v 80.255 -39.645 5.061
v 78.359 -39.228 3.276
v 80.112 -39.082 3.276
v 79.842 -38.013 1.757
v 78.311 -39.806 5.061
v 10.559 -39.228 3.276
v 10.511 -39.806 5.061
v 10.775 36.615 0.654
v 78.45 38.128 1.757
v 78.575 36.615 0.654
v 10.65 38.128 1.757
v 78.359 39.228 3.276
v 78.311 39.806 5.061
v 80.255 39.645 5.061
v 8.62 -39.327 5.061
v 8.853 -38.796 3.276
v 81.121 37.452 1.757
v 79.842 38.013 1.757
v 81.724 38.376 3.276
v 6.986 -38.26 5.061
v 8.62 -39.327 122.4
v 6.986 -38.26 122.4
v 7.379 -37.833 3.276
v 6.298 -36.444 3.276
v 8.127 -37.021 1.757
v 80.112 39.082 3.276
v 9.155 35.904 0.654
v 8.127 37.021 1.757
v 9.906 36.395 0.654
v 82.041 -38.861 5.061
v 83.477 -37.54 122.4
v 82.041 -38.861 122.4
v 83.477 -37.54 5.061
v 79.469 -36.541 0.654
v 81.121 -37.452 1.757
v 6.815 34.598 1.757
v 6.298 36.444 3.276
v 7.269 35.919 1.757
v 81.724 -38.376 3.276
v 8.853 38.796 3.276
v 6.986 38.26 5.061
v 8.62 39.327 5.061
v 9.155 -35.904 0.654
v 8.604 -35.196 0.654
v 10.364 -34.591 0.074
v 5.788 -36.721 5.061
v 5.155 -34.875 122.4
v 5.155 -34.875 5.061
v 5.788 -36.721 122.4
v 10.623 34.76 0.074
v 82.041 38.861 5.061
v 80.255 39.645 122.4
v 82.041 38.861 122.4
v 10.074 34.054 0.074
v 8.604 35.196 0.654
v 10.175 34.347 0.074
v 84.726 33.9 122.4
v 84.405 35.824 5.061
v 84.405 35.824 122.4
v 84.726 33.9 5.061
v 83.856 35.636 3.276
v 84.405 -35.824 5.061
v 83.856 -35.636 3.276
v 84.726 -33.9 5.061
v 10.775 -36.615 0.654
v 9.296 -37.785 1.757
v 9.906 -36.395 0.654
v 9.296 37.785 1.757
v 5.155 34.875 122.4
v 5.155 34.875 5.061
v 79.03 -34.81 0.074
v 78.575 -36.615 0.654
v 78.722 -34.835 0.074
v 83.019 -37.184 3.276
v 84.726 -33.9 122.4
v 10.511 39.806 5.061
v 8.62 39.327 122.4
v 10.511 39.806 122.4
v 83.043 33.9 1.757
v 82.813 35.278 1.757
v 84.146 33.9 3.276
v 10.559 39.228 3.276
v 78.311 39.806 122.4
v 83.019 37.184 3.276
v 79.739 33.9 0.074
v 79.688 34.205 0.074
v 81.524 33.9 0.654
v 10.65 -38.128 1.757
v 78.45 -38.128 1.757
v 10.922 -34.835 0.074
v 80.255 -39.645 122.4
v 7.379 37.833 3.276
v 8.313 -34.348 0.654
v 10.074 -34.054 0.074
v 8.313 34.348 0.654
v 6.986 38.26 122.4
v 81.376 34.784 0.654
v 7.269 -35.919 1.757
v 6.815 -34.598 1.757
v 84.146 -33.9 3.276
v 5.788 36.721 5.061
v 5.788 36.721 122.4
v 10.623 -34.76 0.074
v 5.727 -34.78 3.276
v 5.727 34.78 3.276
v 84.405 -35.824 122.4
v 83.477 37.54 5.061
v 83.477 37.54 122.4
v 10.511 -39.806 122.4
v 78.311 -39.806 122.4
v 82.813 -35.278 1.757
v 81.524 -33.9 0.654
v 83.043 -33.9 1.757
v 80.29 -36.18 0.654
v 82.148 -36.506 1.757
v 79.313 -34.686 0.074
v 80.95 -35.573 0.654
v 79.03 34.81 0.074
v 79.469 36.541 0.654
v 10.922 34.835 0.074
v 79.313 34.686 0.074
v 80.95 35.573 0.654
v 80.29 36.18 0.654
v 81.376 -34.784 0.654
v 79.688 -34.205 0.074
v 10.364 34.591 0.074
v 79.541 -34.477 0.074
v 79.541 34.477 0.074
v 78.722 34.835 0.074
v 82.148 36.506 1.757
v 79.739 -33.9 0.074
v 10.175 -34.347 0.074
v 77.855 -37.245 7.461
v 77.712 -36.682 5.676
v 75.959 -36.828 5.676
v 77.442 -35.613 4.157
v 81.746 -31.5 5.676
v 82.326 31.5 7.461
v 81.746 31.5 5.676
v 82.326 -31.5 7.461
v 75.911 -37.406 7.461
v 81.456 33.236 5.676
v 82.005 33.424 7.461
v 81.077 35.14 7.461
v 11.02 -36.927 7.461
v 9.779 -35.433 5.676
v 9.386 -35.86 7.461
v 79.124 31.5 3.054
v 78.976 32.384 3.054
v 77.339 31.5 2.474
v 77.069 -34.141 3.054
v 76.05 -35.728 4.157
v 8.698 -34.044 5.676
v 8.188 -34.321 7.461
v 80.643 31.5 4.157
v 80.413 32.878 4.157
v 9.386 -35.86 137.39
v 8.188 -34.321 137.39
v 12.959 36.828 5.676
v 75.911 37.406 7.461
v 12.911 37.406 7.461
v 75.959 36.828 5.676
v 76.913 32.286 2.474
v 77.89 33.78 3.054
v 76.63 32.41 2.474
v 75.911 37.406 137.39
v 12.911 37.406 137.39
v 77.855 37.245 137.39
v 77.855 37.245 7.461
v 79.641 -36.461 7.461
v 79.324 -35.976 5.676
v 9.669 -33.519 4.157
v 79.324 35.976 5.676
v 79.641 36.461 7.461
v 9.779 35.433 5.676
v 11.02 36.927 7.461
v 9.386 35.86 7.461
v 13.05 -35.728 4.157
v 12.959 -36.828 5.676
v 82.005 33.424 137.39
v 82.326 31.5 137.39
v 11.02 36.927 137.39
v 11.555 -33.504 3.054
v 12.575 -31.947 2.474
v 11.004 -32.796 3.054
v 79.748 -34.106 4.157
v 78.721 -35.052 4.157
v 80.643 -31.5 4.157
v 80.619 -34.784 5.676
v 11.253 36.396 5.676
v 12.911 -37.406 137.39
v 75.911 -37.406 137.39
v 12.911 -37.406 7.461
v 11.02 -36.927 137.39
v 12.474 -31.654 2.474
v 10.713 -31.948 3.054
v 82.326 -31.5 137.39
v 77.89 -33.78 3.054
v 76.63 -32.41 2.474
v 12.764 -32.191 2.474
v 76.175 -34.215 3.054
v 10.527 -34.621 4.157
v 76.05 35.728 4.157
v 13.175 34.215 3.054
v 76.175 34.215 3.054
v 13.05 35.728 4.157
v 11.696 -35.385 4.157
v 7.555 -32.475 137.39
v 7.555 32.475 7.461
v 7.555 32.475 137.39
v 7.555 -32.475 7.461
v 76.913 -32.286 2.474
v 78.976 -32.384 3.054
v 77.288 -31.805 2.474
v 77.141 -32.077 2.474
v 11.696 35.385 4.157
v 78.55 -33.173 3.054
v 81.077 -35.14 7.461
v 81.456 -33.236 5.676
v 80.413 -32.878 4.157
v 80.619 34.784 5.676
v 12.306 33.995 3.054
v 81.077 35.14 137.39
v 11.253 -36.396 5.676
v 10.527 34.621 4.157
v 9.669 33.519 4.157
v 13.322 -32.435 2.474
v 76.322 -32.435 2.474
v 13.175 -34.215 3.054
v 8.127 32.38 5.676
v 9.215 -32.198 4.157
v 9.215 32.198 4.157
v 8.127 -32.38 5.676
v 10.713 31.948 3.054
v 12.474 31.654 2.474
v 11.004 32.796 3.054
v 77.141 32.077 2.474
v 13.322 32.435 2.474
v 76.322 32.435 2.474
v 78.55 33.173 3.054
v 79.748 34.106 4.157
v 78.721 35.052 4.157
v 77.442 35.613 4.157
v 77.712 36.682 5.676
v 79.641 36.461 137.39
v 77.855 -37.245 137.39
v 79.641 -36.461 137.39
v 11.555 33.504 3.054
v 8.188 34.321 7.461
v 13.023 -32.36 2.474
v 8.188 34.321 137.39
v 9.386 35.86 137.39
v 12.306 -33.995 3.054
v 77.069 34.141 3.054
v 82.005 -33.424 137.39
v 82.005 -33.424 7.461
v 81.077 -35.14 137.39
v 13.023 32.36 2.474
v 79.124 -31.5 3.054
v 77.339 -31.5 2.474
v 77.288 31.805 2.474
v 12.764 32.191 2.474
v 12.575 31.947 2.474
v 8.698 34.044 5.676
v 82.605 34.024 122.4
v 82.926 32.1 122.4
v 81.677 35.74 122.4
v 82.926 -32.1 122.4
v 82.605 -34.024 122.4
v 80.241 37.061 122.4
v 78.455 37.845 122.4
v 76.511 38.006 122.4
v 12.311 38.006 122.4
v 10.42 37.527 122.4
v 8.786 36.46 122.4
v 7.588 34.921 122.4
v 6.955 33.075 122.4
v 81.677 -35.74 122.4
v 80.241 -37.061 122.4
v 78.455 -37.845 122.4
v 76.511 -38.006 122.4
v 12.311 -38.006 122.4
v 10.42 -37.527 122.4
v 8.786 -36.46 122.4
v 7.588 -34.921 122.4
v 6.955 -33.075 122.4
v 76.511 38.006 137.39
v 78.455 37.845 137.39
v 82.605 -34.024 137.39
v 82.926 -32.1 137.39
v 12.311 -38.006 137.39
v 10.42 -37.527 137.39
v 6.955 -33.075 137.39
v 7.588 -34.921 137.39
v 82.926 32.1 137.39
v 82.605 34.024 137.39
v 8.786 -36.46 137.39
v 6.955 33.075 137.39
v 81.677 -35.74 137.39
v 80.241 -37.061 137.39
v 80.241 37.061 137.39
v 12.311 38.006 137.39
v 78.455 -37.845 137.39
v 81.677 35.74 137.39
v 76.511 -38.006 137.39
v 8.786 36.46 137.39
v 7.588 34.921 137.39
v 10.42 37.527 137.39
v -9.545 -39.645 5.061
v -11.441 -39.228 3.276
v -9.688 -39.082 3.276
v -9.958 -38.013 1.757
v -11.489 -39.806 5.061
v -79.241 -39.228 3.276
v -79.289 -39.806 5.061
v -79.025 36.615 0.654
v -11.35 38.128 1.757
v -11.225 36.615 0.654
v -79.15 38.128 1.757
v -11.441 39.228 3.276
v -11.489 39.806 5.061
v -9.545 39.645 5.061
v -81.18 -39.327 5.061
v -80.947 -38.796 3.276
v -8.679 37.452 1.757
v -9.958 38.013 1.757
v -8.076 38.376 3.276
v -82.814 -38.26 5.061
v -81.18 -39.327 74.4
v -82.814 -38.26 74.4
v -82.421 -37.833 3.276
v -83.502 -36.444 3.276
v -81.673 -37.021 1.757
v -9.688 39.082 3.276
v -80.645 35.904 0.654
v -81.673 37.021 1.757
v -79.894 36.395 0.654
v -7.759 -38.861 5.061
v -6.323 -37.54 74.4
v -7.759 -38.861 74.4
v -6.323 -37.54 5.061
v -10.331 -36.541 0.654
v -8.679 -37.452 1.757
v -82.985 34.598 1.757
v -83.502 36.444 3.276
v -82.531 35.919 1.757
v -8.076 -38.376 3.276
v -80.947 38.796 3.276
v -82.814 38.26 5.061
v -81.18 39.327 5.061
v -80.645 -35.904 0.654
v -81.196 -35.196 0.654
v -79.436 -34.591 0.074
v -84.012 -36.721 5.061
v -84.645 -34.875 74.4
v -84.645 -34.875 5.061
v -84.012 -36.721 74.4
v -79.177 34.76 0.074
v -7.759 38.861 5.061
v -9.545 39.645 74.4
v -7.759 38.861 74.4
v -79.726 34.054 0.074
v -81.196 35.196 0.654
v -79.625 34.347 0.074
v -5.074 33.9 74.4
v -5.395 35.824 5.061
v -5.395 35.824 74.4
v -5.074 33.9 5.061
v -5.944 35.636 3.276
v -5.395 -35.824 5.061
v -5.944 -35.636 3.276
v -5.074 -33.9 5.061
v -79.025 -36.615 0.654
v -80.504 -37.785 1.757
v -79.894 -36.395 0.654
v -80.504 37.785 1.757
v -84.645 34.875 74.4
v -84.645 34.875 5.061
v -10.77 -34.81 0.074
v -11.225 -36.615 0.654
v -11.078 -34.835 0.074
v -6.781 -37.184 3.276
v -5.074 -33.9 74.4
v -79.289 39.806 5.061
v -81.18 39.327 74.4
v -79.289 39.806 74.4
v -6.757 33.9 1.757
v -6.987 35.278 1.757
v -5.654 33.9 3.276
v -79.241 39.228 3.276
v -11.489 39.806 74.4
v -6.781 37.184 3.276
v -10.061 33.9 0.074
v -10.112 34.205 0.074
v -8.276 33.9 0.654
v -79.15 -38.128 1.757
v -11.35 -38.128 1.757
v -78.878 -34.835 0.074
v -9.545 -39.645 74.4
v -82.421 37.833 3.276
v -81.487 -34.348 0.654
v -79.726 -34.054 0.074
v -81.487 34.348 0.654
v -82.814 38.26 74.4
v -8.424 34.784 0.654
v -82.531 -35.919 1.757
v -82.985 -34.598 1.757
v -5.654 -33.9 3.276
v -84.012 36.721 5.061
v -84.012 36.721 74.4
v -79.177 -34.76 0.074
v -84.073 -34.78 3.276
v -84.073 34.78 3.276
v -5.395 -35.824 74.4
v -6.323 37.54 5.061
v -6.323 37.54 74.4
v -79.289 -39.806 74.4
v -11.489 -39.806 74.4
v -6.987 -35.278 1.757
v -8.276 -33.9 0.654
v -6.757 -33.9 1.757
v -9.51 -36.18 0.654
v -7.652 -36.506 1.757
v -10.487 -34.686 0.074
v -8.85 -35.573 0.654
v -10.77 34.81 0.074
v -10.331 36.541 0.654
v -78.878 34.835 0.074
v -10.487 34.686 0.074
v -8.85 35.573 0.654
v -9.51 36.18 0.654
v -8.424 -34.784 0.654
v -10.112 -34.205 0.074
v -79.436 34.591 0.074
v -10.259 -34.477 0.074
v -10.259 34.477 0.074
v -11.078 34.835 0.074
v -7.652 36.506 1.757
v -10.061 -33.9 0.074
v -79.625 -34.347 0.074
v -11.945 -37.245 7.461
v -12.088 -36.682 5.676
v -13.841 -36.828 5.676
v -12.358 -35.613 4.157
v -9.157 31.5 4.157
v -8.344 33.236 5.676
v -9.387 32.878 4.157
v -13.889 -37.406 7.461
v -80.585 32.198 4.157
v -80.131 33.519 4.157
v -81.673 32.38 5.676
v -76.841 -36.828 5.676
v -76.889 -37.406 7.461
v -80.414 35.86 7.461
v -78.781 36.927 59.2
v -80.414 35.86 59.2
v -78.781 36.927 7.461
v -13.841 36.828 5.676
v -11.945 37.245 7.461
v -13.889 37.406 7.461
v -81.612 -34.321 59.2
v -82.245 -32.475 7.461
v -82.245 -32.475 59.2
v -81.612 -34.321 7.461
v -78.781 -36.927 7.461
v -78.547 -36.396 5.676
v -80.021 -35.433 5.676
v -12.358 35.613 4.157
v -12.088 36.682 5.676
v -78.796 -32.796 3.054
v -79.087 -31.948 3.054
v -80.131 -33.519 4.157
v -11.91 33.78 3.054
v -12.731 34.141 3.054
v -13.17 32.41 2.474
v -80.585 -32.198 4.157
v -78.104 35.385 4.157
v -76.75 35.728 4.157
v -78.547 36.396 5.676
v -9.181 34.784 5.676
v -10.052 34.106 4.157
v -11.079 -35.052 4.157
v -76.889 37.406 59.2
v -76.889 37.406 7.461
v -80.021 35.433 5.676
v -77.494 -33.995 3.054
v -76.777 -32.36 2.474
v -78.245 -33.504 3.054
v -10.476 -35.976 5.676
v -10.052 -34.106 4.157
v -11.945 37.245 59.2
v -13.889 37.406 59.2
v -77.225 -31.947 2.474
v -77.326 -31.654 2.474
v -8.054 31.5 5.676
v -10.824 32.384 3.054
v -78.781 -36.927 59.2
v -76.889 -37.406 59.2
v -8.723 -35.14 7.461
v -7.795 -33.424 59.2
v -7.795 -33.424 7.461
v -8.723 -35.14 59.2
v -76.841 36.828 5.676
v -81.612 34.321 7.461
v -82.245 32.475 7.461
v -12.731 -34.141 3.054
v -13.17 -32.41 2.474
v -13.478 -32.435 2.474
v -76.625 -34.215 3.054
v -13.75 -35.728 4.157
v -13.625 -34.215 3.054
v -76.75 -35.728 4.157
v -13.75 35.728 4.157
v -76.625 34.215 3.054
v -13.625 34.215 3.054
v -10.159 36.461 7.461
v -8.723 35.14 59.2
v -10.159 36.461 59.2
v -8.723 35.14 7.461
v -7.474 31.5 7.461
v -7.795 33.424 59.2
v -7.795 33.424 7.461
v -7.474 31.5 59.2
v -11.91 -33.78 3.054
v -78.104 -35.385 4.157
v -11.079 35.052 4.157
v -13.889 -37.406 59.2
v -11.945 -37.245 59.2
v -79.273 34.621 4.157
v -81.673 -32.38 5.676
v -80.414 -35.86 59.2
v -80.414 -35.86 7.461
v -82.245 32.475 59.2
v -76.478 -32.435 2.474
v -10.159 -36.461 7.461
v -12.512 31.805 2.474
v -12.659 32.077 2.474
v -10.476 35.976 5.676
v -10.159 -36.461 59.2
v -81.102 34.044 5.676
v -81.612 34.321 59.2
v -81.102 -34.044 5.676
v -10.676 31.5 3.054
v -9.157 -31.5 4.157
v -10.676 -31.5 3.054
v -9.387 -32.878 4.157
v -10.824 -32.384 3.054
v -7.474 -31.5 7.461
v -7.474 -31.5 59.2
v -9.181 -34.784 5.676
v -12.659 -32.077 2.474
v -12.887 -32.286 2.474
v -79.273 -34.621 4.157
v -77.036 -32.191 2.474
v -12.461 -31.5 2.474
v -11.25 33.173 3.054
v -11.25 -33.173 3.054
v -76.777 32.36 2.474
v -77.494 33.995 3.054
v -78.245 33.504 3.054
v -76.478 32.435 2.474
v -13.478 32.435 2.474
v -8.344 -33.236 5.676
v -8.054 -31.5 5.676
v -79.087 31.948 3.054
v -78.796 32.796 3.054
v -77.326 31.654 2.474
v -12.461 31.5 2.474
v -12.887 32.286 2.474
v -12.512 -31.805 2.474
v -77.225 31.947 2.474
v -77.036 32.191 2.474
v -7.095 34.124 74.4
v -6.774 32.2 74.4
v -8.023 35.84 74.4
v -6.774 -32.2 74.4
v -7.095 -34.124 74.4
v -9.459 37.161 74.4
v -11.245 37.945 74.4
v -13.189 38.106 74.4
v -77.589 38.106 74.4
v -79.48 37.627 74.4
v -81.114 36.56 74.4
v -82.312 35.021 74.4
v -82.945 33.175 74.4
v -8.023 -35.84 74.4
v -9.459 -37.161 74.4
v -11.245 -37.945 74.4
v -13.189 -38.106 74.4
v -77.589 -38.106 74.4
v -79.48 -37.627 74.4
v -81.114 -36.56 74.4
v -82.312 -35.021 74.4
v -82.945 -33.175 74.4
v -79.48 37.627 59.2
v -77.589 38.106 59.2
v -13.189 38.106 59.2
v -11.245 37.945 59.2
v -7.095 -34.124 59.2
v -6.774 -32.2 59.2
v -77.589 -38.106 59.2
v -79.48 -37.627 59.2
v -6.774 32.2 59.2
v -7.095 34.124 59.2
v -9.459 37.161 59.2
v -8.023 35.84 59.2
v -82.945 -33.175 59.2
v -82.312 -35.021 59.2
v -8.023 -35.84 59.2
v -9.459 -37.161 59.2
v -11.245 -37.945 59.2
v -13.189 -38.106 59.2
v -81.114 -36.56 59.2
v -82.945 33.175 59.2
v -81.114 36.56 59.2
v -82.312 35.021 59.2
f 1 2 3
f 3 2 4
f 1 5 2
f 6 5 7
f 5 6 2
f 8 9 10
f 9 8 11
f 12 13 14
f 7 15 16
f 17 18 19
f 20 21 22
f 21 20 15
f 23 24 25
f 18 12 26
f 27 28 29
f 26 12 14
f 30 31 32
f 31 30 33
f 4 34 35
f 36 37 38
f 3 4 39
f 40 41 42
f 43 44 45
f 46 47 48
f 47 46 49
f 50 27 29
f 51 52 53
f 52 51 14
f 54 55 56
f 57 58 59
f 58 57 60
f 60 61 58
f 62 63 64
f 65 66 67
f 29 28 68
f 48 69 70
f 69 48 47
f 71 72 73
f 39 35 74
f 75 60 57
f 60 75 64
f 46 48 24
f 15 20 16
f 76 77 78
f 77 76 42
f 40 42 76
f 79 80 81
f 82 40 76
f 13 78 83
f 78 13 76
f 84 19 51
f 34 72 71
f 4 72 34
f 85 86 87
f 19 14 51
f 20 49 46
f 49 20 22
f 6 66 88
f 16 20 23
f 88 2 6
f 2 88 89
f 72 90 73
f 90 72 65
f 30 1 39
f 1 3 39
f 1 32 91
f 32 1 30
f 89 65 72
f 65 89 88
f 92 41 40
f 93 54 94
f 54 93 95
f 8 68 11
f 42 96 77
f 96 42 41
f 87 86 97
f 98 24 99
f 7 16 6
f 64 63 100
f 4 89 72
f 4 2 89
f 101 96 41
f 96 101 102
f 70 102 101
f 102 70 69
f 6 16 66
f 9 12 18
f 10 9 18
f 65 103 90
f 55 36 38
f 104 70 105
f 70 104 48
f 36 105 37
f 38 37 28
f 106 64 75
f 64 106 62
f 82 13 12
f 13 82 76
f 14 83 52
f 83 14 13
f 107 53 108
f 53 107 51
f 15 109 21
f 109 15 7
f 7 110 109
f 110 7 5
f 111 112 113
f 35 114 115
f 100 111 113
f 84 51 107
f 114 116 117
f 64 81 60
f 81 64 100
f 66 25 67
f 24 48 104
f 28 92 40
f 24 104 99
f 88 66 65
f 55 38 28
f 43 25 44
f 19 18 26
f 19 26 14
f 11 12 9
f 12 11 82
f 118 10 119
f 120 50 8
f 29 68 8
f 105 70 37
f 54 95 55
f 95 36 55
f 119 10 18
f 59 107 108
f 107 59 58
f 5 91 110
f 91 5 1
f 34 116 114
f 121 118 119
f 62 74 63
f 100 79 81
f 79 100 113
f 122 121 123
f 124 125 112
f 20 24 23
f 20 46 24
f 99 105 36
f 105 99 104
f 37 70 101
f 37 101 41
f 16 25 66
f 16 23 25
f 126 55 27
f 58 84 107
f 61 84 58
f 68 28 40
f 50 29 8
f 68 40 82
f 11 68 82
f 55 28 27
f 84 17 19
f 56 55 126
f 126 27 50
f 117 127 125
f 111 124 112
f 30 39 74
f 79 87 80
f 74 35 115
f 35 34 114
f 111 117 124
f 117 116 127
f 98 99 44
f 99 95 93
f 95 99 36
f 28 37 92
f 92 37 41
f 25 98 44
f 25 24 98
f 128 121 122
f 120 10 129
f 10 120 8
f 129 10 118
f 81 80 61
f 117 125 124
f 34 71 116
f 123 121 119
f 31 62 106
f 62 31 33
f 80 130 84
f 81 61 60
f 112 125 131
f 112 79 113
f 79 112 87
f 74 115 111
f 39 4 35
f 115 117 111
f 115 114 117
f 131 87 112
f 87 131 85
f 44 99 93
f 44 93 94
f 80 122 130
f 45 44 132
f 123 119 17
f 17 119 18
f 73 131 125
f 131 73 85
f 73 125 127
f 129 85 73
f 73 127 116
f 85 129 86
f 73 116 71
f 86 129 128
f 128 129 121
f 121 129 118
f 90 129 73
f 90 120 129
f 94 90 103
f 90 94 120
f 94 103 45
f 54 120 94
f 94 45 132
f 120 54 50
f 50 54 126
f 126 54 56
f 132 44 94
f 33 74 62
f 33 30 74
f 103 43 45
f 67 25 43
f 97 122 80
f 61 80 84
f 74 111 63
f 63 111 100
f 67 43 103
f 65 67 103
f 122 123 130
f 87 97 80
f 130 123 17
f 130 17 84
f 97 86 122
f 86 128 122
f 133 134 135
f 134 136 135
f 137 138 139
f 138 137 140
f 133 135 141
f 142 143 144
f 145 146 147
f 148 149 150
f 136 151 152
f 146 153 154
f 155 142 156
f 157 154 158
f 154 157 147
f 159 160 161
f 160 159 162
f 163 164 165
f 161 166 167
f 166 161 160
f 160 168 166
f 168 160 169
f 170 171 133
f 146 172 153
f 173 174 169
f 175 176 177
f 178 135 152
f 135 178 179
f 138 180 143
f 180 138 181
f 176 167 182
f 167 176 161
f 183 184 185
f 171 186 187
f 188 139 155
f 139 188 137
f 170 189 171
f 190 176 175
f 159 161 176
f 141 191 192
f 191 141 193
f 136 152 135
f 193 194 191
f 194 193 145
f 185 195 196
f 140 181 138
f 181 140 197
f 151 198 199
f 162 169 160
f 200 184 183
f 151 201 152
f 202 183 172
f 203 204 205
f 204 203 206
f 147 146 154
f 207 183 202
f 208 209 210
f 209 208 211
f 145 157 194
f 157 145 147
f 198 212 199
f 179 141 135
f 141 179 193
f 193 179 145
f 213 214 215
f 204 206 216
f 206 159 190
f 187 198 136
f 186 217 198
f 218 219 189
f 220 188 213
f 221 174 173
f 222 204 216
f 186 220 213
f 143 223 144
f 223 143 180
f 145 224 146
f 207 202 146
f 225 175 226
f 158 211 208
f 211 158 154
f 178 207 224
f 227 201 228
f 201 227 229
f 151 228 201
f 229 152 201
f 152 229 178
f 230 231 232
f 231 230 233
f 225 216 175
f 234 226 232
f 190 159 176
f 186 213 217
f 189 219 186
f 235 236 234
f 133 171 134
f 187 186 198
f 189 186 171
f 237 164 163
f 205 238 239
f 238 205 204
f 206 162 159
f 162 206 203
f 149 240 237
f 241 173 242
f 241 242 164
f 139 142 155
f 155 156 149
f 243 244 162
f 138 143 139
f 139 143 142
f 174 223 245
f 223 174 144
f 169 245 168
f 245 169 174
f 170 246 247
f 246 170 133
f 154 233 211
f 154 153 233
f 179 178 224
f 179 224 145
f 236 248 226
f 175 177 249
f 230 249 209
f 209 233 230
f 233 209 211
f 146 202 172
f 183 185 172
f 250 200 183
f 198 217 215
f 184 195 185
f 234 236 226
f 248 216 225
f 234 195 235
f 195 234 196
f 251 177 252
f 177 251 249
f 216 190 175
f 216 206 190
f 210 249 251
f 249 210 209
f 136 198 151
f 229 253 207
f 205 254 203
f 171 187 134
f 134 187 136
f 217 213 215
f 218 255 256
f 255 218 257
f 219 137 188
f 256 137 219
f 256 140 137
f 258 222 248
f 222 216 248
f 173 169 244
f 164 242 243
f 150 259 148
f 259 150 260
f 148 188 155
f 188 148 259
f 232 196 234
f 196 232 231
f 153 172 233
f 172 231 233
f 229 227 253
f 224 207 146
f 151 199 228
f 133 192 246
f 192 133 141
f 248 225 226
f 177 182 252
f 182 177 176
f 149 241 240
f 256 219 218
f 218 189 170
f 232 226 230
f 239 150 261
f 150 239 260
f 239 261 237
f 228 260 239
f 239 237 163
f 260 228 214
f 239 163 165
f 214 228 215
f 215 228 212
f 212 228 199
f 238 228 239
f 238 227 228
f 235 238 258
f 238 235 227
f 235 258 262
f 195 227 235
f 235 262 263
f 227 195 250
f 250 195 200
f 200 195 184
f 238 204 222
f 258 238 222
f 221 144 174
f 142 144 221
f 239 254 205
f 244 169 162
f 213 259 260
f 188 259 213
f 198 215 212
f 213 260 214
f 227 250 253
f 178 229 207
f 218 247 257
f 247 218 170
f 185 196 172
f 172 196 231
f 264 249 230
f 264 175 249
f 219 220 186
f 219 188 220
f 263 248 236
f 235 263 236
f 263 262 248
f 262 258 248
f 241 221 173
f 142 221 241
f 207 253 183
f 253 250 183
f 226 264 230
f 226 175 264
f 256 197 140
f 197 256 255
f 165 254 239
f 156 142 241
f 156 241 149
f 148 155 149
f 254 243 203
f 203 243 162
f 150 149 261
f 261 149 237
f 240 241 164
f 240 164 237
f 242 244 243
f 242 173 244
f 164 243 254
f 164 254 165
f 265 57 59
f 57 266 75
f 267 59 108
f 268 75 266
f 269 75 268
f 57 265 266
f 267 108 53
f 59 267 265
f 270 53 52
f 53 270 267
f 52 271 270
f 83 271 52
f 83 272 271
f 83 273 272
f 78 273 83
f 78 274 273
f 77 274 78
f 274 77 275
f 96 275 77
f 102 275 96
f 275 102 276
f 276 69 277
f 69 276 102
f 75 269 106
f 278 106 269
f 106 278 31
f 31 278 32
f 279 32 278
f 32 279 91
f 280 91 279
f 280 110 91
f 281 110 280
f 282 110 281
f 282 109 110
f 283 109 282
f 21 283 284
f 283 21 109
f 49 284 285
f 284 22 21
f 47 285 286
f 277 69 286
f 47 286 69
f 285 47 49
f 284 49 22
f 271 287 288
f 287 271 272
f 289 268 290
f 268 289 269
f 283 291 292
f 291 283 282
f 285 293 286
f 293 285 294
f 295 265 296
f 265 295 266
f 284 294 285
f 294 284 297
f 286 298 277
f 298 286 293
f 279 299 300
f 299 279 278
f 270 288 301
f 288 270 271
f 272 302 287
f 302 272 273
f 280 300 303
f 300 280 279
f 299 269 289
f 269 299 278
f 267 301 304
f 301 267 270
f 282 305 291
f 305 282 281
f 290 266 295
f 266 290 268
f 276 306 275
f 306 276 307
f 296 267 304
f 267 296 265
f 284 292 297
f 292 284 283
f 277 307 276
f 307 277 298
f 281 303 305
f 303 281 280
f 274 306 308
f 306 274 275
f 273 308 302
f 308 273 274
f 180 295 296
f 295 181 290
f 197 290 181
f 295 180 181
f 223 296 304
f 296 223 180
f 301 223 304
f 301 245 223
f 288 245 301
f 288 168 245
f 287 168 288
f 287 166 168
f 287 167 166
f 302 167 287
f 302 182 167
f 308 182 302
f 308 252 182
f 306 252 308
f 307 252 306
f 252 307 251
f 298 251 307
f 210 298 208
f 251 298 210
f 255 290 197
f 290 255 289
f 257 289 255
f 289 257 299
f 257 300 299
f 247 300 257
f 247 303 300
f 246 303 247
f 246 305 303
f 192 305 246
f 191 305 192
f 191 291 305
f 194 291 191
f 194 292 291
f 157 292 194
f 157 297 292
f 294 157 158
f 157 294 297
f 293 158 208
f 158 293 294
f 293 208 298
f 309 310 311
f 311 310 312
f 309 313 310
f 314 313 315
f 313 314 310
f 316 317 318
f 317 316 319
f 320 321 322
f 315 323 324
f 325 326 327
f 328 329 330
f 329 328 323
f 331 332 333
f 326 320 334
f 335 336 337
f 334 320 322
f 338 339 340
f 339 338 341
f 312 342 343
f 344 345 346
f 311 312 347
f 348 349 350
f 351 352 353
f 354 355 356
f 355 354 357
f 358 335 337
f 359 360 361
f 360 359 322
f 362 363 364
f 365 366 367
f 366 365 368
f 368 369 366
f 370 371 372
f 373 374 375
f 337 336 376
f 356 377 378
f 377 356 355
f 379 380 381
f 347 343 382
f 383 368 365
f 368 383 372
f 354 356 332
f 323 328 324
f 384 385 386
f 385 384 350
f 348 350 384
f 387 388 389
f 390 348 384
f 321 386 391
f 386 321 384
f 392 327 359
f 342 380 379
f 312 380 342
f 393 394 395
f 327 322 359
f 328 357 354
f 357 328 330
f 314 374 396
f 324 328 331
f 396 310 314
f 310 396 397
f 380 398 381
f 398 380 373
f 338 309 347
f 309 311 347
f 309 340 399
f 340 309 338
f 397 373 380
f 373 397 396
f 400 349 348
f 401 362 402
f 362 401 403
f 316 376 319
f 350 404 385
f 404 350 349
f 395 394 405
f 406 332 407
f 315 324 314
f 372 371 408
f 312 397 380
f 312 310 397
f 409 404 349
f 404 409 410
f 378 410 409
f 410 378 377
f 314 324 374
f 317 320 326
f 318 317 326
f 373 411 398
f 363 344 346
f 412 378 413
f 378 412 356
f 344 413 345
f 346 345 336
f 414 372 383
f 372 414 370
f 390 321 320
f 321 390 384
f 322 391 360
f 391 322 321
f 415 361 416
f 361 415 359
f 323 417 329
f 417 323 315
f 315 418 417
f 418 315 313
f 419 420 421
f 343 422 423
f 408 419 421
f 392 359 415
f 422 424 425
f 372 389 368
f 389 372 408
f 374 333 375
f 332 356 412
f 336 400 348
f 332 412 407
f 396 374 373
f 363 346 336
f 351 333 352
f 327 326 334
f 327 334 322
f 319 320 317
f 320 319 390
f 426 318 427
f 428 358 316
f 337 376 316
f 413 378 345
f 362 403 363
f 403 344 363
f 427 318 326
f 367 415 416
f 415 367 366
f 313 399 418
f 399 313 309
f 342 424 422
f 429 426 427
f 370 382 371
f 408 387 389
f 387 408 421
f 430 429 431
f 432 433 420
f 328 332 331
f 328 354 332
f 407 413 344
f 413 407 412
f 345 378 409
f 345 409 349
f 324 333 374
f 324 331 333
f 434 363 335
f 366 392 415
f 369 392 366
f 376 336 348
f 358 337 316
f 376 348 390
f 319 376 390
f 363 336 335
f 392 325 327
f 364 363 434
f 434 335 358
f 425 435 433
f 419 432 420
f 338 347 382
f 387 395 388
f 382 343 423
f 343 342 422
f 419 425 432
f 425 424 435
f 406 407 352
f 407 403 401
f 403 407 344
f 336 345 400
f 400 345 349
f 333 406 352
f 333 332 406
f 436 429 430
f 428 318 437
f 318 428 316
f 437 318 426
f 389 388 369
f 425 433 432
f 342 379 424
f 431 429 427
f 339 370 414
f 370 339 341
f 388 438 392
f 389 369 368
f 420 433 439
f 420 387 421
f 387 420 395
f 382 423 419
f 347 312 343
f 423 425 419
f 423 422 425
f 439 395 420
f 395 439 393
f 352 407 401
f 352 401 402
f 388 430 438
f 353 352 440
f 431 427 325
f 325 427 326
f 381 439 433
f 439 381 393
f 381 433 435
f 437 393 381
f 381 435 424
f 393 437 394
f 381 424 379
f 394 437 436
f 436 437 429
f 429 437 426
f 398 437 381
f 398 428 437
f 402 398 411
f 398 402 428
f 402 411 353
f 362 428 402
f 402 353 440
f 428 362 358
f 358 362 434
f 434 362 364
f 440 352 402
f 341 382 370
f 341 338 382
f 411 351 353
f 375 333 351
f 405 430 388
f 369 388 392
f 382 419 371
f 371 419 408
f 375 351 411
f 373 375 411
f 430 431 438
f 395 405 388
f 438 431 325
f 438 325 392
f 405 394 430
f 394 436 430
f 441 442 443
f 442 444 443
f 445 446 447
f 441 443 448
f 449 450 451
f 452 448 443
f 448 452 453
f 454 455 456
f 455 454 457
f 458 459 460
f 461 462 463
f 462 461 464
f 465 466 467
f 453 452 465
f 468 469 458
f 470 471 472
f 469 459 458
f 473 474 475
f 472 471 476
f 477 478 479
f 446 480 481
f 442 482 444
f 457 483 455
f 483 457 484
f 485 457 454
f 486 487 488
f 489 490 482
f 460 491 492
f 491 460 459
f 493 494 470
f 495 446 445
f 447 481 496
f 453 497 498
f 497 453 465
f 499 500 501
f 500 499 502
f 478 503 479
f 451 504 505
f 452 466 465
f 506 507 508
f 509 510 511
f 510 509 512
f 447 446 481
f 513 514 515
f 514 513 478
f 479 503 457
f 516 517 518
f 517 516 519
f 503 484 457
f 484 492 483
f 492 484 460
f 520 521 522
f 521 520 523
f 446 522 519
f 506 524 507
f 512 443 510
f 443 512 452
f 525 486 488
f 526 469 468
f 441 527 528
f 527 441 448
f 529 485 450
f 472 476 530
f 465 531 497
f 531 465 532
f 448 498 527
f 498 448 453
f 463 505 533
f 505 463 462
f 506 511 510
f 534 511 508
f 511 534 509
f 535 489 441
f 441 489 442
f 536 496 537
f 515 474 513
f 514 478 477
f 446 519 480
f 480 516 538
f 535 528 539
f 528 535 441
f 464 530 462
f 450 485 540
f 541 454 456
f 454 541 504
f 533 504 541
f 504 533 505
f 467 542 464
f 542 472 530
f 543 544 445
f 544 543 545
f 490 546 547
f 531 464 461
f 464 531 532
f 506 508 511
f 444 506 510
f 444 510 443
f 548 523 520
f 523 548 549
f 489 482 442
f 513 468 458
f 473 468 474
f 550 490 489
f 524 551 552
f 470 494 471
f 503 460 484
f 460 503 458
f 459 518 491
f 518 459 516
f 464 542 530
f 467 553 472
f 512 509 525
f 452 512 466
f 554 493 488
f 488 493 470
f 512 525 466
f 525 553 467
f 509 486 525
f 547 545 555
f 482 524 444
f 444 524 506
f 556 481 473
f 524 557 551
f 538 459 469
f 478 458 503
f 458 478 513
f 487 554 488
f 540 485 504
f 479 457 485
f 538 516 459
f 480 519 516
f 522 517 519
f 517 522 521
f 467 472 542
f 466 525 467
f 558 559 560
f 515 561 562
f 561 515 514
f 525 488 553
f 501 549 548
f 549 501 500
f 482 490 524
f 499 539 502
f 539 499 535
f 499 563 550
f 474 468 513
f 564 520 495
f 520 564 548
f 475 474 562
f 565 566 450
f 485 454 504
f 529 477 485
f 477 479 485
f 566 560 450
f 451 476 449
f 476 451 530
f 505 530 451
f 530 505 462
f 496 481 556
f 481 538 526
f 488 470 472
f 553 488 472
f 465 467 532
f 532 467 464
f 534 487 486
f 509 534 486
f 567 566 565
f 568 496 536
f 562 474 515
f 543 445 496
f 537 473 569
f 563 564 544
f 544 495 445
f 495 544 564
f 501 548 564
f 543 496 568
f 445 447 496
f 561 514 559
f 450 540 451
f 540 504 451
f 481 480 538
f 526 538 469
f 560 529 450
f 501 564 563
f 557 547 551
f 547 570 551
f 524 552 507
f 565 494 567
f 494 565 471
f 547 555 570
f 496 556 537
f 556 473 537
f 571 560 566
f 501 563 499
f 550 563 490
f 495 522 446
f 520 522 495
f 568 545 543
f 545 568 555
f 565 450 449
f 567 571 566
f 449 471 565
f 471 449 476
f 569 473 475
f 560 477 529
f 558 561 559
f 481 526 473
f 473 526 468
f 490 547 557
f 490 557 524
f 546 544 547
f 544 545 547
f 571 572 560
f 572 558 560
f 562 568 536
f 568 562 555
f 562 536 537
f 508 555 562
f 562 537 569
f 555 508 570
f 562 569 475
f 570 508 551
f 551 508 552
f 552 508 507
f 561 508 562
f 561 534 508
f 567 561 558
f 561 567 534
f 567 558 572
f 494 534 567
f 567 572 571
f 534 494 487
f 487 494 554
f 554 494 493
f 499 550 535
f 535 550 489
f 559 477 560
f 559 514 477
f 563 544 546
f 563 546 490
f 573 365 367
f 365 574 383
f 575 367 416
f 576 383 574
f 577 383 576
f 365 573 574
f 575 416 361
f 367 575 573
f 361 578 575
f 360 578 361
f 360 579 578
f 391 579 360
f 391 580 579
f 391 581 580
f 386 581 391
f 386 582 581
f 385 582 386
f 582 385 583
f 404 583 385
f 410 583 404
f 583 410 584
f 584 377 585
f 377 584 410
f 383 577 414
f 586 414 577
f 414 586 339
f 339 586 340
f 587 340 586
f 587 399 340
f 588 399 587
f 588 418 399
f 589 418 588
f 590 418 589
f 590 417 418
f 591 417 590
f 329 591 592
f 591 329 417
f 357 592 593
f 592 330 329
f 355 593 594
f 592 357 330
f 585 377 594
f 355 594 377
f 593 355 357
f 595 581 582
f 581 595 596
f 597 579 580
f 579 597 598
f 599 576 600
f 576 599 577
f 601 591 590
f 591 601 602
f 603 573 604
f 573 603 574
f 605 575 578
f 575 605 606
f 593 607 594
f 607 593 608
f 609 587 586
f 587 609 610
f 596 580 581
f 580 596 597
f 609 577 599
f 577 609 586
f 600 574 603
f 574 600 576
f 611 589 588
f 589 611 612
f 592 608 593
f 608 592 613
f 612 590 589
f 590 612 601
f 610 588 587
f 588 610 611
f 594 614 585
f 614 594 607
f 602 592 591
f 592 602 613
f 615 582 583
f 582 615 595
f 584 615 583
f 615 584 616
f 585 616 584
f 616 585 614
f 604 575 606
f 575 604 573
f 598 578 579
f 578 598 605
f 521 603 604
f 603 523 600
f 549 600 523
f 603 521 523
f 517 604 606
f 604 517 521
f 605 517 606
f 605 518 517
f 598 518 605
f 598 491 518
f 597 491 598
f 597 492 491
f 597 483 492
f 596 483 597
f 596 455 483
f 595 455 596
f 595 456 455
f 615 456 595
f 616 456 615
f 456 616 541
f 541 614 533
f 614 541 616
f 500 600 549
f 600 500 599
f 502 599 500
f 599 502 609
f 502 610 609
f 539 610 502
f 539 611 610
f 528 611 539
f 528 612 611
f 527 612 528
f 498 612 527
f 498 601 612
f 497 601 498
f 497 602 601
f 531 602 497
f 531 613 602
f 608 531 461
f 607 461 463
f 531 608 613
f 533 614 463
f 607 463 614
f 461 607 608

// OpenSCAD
// file: boxes.scad
// Library: boxes.scad
// Version: 1.0
// Author: Marius Kintel
// Copyright: 2010
// License: 2-clause BSD License (http://opensource.org/licenses/BSD-2-Clause)

// 
// roundedCube([x, y, z], r, sidesonly=true/false, center=true/false);
// roundedCube(x, r, sidesonly=true/false, center=true/false);

// EXAMPLE USAGE:
// roundedCube([20, 30, 40], 5, true, true);

// Only for backwards compatibility with existing scripts, (always centered, radius instead of consistent "r" naming.
module roundedBox(size, radius, sidesonly)
{
  echo("WARNING: roundedBox(size, radius, sidesonly) is deprecated, use roundedCube(size, r, sidesonly, center)");
  roundedCube(size, radius, sidesonly, true);
}

// New implementation
module roundedCube(size, r, sidesonly, center) {
  s = is_list(size) ? size : [size,size,size];
  translate(center ? -s/2 : [0,0,0]) {
    if (sidesonly) {
      hull() {
        translate([     r,     r]) cylinder(r=r, h=s[2]);
        translate([     r,s[1]-r]) cylinder(r=r, h=s[2]);
        translate([s[0]-r,     r]) cylinder(r=r, h=s[2]);
        translate([s[0]-r,s[1]-r]) cylinder(r=r, h=s[2]);
      }
    }
    else {
      hull() {
        translate([     r,     r,     r]) sphere(r=r);
        translate([     r,     r,s[2]-r]) sphere(r=r);
        translate([     r,s[1]-r,     r]) sphere(r=r);
        translate([     r,s[1]-r,s[2]-r]) sphere(r=r);
        translate([s[0]-r,     r,     r]) sphere(r=r);
        translate([s[0]-r,     r,s[2]-r]) sphere(r=r);
        translate([s[0]-r,s[1]-r,     r]) sphere(r=r);
        translate([s[0]-r,s[1]-r,s[2]-r]) sphere(r=r);
      }
    }
  }
}
// main file
include <boxes.scad>

// Internal width of box
width_inner = 75;

// Internal bength of box
length_inner = 75;

// Internal height of bottom of box
base_height = 120;

// Internal height of the top/lid of the box
lid_height = 72;

// Height of the lip to generate
overlap_height = 15;

// Thickness of the outer wall
wall_thickness = 2.4;

// How curved to make the corners
radius = 6; // [1:10]

// Tolerance between lid and lip
tolerance = 0.2;

// Ratio of lip to regular wall thickness
lip_thickness_ratio = 0.5;

height_inner = base_height + lid_height;

lip_thickness = wall_thickness * lip_thickness_ratio;

width_outer = width_inner + wall_thickness*2;
length_outer = length_inner + wall_thickness*2;
height_outer = height_inner + wall_thickness*2;

module lip(tol = 0) {
    difference() {
        // The outside shell
        roundedCube(
            [width_inner+lip_thickness+tol,length_inner+lip_thickness+tol,overlap_height*2],
            radius,
            center=true
        );
        // The inside cavity
        roundedCube(
            [width_inner-tol,length_inner-tol,overlap_height*2-wall_thickness/2],
            radius,
            center=true
        );
        // Slice off the top
        translate(v=[0,0,overlap_height+tol]) 
            cube([width_outer+1, length_outer+1,overlap_height], center=true);
        // Slice off the bottom
        translate(v=[0,0,-overlap_height-tol]) 
            cube([width_outer+1, length_outer+1,overlap_height], center=true);
    } 
}

module openBox(height) {
    other_height = height_outer-height;
    cut_height = height_outer/2-other_height/2;
     
    difference() {
        // The outside shell
        roundedCube([width_outer,length_outer,height_outer],radius,center=true);
        // The inside cavity
        roundedCube([width_inner,length_inner,height_inner],radius,center=true);
        // Cut the top off
        translate(v=[0,0,cut_height]) cube([width_outer+1,length_outer+1,other_height],center=true);
        }
}

module base() {
    base_height_outer = base_height + wall_thickness;
    
    union() {
        translate(v=[0,0,height_outer/2]) 
            openBox(base_height_outer);
        // The -0.01 is designed to ensure the lip intersects with the
        // box so they generate a complete 2-manifold object.
        translate(v=[0,0,base_height_outer + overlap_height/2 - .01]) lip();
    }
}

module lid() {
    lid_height_outer = lid_height + wall_thickness;

    difference() {
        translate(v=[0,0,height_outer/2]) 
            openBox(lid_height_outer);
        translate(v=[0,0,lid_height_outer - overlap_height/2]) lip(tolerance);
    }
}

module boxAndLid() {
	translate(v=[(width_outer/2)+5,0,0]) base();
	translate(v=[(width_outer/-2)-5,0,0]) lid();
}

// Round box
boxAndLid();
